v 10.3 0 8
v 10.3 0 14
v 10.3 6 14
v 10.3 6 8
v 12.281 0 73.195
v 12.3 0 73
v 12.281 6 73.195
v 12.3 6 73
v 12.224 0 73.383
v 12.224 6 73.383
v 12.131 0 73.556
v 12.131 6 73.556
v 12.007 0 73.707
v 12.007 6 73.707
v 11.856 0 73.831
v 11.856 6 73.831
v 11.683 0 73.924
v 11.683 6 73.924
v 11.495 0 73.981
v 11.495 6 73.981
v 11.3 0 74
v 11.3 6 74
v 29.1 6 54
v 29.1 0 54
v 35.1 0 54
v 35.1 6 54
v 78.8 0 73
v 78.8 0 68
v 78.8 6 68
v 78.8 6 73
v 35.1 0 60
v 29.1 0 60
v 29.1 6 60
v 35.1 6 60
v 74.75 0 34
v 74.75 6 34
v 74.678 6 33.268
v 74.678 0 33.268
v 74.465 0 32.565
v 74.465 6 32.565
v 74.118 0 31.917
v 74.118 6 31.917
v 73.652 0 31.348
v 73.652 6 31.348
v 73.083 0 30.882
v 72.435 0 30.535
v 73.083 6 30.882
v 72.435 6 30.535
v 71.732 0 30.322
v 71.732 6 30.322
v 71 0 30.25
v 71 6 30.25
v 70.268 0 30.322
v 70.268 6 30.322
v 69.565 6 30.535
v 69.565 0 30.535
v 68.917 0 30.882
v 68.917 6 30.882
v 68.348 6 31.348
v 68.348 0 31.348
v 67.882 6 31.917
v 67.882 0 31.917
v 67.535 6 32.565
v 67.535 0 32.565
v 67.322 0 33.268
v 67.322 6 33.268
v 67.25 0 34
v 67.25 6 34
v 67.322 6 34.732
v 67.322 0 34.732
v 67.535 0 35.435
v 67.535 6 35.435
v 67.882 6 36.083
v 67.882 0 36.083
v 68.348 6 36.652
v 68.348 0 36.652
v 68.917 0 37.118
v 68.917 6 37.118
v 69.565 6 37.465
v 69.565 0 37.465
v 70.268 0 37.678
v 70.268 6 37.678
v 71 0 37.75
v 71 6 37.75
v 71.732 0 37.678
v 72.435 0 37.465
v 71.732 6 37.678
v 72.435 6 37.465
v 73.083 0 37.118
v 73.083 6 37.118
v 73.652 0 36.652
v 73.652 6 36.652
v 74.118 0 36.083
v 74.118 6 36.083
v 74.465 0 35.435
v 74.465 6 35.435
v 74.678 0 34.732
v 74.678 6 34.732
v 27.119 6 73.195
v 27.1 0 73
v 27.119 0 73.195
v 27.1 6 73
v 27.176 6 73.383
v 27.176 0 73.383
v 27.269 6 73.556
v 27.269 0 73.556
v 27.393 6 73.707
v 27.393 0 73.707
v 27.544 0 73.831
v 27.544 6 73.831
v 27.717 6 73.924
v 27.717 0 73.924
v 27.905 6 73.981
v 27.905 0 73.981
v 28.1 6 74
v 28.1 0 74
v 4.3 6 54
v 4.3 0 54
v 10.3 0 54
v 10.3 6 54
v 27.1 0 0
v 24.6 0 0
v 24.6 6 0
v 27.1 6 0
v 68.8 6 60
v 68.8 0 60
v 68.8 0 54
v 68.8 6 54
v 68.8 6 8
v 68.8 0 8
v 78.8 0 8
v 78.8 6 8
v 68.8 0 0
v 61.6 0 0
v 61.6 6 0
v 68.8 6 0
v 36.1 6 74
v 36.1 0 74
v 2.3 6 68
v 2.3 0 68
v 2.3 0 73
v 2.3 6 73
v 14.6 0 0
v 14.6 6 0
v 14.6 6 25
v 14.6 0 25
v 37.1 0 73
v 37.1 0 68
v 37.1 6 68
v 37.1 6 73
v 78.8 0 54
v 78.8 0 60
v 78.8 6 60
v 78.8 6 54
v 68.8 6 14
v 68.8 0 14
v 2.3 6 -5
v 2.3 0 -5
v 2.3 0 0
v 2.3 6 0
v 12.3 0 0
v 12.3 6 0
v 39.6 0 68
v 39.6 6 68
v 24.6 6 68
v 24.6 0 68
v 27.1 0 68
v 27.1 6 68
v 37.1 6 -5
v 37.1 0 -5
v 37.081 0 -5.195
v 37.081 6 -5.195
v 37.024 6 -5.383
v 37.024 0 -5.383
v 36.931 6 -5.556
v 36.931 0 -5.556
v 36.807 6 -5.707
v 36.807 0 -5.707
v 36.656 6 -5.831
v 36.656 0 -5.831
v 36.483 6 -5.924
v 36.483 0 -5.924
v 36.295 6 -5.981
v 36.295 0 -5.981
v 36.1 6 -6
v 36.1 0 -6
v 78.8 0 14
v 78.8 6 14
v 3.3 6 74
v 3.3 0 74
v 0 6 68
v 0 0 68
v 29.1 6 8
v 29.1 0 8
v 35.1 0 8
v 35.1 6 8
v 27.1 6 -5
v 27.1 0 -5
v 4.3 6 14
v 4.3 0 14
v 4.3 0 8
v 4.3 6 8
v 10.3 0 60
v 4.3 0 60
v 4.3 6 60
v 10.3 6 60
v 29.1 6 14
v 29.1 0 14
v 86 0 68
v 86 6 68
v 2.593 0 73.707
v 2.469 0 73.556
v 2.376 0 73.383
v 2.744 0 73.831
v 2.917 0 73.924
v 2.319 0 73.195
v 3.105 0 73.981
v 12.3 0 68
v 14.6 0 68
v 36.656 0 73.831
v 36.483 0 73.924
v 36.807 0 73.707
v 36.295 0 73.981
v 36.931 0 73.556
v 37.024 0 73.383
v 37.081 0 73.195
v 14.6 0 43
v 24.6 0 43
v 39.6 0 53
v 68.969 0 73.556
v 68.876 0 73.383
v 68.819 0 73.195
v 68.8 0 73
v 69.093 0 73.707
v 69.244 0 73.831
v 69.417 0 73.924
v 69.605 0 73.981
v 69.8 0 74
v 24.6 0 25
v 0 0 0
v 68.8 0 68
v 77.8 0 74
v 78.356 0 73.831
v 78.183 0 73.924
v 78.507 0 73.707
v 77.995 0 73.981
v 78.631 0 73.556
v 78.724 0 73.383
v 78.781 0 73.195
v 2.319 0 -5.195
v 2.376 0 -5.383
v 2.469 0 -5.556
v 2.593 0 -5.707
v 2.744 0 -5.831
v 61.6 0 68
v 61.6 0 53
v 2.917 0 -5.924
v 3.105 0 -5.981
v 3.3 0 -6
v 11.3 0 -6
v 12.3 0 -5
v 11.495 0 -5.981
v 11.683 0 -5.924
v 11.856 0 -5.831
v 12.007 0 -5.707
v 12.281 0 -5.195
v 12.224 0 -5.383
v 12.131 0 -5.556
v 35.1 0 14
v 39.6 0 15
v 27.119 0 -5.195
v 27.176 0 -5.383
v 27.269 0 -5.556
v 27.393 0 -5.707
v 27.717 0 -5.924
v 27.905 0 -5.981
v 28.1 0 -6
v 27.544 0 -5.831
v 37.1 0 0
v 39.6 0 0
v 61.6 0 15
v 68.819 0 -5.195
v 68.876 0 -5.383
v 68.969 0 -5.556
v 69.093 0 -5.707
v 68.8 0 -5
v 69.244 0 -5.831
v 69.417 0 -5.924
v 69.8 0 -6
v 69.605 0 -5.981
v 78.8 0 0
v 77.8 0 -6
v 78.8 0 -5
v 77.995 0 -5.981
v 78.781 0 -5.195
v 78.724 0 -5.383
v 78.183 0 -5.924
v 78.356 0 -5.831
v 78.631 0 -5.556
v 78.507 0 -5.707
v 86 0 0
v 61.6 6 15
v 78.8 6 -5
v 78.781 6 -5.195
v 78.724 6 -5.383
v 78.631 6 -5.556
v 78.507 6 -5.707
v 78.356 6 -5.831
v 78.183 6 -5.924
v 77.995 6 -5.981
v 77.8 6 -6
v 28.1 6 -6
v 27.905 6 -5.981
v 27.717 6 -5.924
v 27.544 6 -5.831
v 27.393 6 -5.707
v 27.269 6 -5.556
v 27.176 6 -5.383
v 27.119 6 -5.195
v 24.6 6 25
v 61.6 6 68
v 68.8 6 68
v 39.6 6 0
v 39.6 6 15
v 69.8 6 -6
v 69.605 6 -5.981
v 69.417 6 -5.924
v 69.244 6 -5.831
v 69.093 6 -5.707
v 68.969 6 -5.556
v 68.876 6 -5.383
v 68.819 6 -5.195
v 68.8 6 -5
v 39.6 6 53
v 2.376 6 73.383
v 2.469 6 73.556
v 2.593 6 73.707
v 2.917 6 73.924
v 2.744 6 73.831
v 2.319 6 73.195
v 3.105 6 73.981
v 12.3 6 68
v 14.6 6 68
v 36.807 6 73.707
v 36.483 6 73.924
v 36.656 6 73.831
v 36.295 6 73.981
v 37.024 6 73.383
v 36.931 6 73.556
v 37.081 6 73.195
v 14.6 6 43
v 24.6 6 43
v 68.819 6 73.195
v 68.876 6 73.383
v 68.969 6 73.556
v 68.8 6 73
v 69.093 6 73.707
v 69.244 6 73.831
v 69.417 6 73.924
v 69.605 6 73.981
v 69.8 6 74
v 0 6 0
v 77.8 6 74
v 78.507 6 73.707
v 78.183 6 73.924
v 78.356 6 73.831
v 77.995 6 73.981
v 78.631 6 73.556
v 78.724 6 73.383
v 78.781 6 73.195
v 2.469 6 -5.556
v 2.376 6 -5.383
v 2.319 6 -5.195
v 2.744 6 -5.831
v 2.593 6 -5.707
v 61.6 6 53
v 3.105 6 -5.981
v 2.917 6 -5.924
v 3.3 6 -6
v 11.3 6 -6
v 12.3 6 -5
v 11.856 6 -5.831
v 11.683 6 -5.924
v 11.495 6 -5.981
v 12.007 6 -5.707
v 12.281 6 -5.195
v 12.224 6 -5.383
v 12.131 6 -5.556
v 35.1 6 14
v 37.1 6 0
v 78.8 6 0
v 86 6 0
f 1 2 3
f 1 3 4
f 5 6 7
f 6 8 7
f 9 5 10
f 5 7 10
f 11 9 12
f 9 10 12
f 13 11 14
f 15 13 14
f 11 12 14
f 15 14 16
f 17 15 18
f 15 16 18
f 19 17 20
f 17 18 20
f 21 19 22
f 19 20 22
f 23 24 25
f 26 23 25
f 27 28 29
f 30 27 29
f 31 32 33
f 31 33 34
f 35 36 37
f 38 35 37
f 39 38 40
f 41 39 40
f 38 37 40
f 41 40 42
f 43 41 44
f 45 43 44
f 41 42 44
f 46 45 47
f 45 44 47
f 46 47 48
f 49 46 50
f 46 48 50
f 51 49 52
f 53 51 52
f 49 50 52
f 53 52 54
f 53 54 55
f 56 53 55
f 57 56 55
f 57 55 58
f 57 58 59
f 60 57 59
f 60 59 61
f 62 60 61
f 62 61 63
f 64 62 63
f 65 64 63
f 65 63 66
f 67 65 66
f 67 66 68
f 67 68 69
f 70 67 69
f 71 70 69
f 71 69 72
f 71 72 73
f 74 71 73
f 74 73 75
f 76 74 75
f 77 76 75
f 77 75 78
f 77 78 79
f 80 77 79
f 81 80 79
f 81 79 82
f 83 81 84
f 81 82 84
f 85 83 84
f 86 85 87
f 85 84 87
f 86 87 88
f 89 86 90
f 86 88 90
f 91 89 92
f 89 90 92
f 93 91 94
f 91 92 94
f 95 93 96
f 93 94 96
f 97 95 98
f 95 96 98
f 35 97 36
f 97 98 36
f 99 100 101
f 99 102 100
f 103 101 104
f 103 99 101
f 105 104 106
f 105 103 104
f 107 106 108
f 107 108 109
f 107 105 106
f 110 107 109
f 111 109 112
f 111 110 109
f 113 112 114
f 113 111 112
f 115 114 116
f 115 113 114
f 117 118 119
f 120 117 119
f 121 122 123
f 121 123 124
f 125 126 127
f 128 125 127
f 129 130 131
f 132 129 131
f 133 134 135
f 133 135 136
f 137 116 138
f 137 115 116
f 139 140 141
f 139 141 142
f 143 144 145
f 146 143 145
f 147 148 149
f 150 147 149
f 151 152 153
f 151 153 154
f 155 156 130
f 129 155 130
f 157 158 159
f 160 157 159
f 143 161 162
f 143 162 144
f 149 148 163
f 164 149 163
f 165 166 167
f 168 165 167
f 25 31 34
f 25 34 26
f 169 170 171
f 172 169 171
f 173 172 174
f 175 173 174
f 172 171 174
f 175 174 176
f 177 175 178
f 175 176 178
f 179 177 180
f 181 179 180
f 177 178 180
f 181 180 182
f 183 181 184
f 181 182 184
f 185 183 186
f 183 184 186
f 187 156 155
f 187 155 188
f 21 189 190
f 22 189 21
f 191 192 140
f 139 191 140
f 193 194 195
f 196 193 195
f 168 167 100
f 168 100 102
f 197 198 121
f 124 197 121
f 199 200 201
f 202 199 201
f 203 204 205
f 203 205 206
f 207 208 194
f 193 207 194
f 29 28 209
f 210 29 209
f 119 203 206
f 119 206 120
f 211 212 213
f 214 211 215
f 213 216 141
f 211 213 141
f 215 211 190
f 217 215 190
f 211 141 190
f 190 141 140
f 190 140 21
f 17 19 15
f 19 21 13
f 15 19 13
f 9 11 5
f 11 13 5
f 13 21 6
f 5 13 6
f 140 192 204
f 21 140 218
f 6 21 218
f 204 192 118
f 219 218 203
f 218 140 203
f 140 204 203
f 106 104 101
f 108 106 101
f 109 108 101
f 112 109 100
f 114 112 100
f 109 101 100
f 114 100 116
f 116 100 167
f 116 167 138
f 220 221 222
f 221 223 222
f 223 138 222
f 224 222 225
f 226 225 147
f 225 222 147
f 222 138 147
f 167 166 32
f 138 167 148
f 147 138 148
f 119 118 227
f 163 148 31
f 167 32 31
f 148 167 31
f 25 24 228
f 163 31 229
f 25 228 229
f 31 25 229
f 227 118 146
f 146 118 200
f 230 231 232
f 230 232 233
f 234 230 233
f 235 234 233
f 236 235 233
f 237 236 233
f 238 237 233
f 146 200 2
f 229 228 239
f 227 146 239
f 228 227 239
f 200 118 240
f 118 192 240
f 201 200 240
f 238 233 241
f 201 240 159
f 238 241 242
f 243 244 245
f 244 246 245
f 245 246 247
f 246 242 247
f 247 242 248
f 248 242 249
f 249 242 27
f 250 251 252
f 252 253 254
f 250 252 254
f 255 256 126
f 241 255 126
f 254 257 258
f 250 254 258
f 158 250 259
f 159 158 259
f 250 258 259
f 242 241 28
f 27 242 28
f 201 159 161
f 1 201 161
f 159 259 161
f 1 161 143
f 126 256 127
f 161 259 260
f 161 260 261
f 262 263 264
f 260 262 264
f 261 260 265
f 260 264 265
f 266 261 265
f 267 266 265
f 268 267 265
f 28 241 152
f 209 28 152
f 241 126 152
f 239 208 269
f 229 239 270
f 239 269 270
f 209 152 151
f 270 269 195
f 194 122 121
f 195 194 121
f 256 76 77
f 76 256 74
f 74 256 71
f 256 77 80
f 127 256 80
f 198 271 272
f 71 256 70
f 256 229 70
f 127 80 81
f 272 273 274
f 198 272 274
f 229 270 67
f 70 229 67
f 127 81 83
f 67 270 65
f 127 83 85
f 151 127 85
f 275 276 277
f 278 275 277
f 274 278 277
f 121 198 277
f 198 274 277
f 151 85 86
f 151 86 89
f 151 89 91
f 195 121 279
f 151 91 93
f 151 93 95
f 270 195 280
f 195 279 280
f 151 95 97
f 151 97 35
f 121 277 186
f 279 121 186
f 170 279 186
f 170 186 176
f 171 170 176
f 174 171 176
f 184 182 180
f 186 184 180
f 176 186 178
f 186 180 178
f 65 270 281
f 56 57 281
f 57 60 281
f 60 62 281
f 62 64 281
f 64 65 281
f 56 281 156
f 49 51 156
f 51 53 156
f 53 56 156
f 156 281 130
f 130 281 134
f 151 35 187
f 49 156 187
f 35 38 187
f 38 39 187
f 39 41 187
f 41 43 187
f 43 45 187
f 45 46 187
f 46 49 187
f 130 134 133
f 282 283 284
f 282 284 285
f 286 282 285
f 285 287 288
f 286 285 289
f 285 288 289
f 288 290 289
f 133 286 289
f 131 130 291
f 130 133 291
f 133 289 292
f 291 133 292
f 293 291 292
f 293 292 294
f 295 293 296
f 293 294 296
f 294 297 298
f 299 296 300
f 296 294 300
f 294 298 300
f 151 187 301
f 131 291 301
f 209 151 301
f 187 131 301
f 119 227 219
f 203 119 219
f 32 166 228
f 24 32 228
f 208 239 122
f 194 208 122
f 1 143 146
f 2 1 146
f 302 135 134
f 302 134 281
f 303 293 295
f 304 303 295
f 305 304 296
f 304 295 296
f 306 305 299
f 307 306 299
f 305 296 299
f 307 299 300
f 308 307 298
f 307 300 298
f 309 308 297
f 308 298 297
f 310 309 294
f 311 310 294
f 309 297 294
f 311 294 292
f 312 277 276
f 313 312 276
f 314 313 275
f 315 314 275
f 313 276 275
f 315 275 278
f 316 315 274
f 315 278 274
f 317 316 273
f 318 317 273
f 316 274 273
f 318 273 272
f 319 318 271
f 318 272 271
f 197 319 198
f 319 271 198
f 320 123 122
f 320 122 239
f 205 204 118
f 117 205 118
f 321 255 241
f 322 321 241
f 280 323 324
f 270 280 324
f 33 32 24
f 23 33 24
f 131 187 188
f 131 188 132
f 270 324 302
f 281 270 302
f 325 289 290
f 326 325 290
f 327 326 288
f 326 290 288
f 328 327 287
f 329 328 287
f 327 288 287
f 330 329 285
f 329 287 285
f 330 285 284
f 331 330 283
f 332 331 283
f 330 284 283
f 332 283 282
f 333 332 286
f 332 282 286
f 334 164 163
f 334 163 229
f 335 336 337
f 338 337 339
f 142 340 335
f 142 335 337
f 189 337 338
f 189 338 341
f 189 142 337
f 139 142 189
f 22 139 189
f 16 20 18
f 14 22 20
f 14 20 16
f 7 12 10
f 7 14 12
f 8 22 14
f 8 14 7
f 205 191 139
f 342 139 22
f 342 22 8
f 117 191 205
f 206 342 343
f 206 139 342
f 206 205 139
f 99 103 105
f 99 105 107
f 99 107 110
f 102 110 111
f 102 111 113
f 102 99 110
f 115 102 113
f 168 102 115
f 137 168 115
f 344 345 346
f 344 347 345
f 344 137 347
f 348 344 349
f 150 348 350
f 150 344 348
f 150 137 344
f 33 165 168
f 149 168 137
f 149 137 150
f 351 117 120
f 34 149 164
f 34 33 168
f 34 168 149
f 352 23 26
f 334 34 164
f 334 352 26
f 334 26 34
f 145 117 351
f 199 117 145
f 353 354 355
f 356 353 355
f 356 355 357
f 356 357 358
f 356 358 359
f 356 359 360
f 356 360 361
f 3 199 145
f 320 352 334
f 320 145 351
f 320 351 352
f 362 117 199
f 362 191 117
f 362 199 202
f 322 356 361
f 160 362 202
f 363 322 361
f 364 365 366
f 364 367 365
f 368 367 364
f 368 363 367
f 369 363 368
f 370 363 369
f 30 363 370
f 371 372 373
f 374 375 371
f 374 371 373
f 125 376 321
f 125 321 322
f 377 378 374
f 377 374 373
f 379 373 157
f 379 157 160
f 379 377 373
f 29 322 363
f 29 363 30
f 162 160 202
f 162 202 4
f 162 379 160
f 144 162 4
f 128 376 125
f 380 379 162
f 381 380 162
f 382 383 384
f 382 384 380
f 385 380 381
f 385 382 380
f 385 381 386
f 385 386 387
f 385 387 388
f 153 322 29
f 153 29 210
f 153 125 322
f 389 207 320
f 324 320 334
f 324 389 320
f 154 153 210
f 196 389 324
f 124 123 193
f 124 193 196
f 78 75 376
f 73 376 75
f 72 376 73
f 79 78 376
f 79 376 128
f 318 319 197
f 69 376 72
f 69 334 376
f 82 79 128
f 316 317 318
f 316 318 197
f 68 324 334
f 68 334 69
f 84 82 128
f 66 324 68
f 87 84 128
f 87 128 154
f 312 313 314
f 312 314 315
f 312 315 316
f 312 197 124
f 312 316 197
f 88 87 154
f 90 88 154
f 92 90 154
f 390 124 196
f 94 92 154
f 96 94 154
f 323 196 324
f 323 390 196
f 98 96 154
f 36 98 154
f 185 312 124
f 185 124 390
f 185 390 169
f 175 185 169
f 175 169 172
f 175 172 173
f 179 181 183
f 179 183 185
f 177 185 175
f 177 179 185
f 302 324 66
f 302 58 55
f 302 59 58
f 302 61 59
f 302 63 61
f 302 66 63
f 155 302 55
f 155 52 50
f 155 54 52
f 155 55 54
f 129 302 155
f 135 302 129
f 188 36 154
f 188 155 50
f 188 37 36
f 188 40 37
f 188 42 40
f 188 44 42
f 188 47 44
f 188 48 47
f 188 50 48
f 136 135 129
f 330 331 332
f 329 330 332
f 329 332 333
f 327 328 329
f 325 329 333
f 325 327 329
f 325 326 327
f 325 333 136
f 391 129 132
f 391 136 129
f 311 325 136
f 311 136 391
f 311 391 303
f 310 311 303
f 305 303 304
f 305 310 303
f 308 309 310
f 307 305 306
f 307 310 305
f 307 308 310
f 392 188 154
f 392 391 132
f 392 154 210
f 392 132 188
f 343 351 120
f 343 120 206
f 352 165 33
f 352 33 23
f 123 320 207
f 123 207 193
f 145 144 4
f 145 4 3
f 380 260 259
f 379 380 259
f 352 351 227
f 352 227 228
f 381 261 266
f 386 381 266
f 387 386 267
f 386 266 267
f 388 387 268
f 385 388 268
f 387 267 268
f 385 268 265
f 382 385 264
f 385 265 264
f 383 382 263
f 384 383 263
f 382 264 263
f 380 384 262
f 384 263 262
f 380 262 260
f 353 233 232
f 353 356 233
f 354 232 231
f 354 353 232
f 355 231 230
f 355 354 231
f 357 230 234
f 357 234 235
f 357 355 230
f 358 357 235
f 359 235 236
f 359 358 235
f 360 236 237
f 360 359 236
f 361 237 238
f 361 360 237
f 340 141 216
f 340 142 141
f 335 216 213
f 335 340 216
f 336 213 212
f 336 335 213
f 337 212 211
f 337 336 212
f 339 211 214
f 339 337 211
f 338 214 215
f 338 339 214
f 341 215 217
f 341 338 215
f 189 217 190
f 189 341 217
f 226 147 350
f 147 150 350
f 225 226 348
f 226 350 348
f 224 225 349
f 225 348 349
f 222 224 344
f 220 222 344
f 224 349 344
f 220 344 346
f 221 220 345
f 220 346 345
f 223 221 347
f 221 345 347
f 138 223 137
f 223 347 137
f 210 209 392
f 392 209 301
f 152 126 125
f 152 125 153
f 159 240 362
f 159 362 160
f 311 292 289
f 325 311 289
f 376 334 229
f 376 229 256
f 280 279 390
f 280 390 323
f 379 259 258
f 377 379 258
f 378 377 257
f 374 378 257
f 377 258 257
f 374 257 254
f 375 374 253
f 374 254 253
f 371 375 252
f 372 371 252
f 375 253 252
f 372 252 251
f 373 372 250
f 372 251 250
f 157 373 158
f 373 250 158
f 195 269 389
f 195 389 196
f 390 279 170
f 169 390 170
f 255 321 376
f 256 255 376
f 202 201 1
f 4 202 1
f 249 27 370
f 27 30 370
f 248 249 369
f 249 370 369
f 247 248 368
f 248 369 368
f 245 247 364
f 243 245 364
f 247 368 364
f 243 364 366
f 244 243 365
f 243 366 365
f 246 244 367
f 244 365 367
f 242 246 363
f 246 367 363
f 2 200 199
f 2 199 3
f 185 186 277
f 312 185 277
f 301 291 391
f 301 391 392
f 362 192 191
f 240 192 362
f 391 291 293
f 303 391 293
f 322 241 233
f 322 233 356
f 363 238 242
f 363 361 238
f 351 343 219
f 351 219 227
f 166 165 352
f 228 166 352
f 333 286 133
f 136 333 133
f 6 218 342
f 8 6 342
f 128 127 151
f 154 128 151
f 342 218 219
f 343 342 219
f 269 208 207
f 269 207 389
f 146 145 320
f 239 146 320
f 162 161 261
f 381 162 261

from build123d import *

# Parameters (mm, degrees)
SKETCH1_W                  = 86
SKETCH1_H                  = 68
BOSS_EXTRUDE1_DEPTH        = 6
SKETCH2_W                  = 10
SKETCH2_H                  = 25
SKETCH2_W_2                = 22
SKETCH2_H_2                = 15
CUT_EXTRUDE1_DEPTH         = 110.79981785
F_7_5_7_5_DIAMETER_HOLE1_D = 7.5
SKETCH234_W                = 10
SKETCH234_H                = 6
BOSS_EXTRUDE234_DEPTH      = 6
FILLET134_R                = 1
SKETCH2341_W               = 10
SKETCH2341_H               = 6
BOSS_EXTRUDE2341_DEPTH     = 6
FILLET1341_R               = 1
SKETCH2342_W               = 10
SKETCH2342_H               = 6
BOSS_EXTRUDE2342_DEPTH     = 6
FILLET1342_R               = 1
CUT_EXTRUDE11_START        = -3
SKETCH6_W                  = 10
SKETCH6_H                  = 6
CUT_EXTRUDE11_DEPTH        = 6
CUT_EXTRUDE16_DEPTH        = 82.966859266
CUT_EXTRUDE16_DEPTH_BACK   = 82.966859266
SKETCH64_W                 = 6
SKETCH64_H                 = 6
CUT_EXTRUDE18_DEPTH        = 101.225385192
CUT_EXTRUDE18_DEPTH_BACK   = 101.225385192
SKETCH66_W                 = 6
SKETCH66_H                 = 6
MIRROR2_OUTLINE_W          = 10
MIRROR2_OUTLINE_H          = 6
MIRROR2_OUTLINE_W_2        = 6
MIRROR2_DEPTH              = 6
MIRROR2_2_DEPTH            = 6


# Read off the part's stored shape, not the designer's step: Mirror2
with BuildPart() as part:
    # Sketch1 → Boss-Extrude1 (new body)
    with BuildSketch(Plane(origin=(0, 0, 0), x_dir=(1, 0, 0), z_dir=(0, 1, 0))):
        with Locations((43, -34)):
            Rectangle(SKETCH1_W, SKETCH1_H)
    extrude(amount=BOSS_EXTRUDE1_DEPTH)

    # Sketch2 → Cut-Extrude1 (cut, through all)
    with BuildSketch(Plane(origin=(0, 6, 0), x_dir=(1, 0, 0), z_dir=(0, 1, 0))):
        with Locations((19.6, -55.5)):
            Rectangle(SKETCH2_W, SKETCH2_H)
        with Locations((50.6, -60.5)):
            Rectangle(SKETCH2_W_2, SKETCH2_H_2)
    cut_extrude1 = extrude(amount=-CUT_EXTRUDE1_DEPTH, mode=Mode.SUBTRACT)

    # Mirror1: Cut-Extrude1 across plane
    add(cut_extrude1.mirror(Plane.XY.offset(34)), mode=Mode.SUBTRACT)

    # Ø7.5 (7.5) Diameter Hole1 (through all)
    with Locations(Plane(origin=(0, 0, 0), x_dir=(-1, 0, 0), z_dir=(0, -1, 0))):
        with Locations((-71, -34)):
            Hole(F_7_5_7_5_DIAMETER_HOLE1_D / 2)

    # Sketch234 → Boss-Extrude234 (add)
    with BuildSketch(Plane(origin=(73.032221392, 0, 68), x_dir=(1, 0, 0), z_dir=(0, 0, 1))):
        with Locations((0.767778608, 3)):
            Rectangle(SKETCH234_W, SKETCH234_H)
    extrude(amount=BOSS_EXTRUDE234_DEPTH)

    # Fillet134
    fillet134_edges = [part.edges().sort_by_distance(p)[0] for p in [
        (78.8, 3, 74),
        (68.8, 3, 74),
    ]]
    fillet(fillet134_edges, radius=FILLET134_R)

    # Sketch2341 → Boss-Extrude2341 (add)
    with BuildSketch(Plane(origin=(31.332221392, 0, 68), x_dir=(1, 0, 0), z_dir=(0, 0, 1))):
        with Locations((0.767778608, 3)):
            Rectangle(SKETCH2341_W, SKETCH2341_H)
    extrude(amount=BOSS_EXTRUDE2341_DEPTH)

    # Fillet1341
    fillet1341_edges = [part.edges().sort_by_distance(p)[0] for p in [
        (37.1, 3, 74),
        (27.1, 3, 74),
    ]]
    fillet(fillet1341_edges, radius=FILLET1341_R)

    # Sketch2342 → Boss-Extrude2342 (add)
    with BuildSketch(Plane(origin=(6.532221392, 0, 68), x_dir=(1, 0, 0), z_dir=(0, 0, 1))):
        with Locations((0.767778608, 3)):
            Rectangle(SKETCH2342_W, SKETCH2342_H)
    extrude(amount=BOSS_EXTRUDE2342_DEPTH)

    # Fillet1342
    fillet1342_edges = [part.edges().sort_by_distance(p)[0] for p in [
        (12.3, 3, 74),
        (2.3, 3, 74),
    ]]
    fillet(fillet1342_edges, radius=FILLET1342_R)

    # Sketch6 → Cut-Extrude11 (cut)
    with BuildSketch(Plane(origin=(73.032221392, 3, 13), x_dir=(1, 0, 0), z_dir=(0, 1, 0)).offset(CUT_EXTRUDE11_START)):
        with Locations((0.767778608, -44)):
            Rectangle(SKETCH6_W, SKETCH6_H)
    extrude(amount=CUT_EXTRUDE11_DEPTH, mode=Mode.SUBTRACT)

    # Sketch64 → Cut-Extrude16 (cut, two sides: drawn at the far end of the back side and taken through both)
    with BuildSketch(Plane(origin=(31.332221392, 3, 13), x_dir=(1, 0, 0), z_dir=(0, 1, 0)).offset(-CUT_EXTRUDE16_DEPTH_BACK)):
        with Locations((0.767778608, -44)):
            Rectangle(SKETCH64_W, SKETCH64_H)
    extrude(amount=CUT_EXTRUDE16_DEPTH + CUT_EXTRUDE16_DEPTH_BACK, mode=Mode.SUBTRACT)

    # Sketch66 → Cut-Extrude18 (cut, two sides: drawn at the far end of the back side and taken through both)
    with BuildSketch(Plane(origin=(6.532221392, 3, 13), x_dir=(1, 0, 0), z_dir=(0, 1, 0)).offset(-CUT_EXTRUDE18_DEPTH_BACK)):
        with Locations((0.767778608, -44)):
            Rectangle(SKETCH66_W, SKETCH66_H)
    extrude(amount=CUT_EXTRUDE18_DEPTH + CUT_EXTRUDE18_DEPTH_BACK, mode=Mode.SUBTRACT)

    # Mirror2 outline → Mirror2 (cut)
    with BuildSketch(Plane(origin=(0, 0, 0), x_dir=(1, 0, 0), z_dir=(0, 1, 0))):
        with Locations((73.8, -11)):
            Rectangle(MIRROR2_OUTLINE_W, MIRROR2_OUTLINE_H)
        with Locations((32.1, -11)):
            Rectangle(MIRROR2_OUTLINE_W_2, MIRROR2_OUTLINE_H)
        with Locations((7.3, -11)):
            Rectangle(MIRROR2_OUTLINE_W_2, MIRROR2_OUTLINE_H)
    extrude(amount=MIRROR2_DEPTH, mode=Mode.SUBTRACT)

    # Mirror2 2 outline → Mirror2 2 (add)
    with BuildSketch(Plane(origin=(0, 0, 0), x_dir=(1, 0, 0), z_dir=(0, 1, 0))):
        with BuildLine():
            Line((68.8, 0), (78.8, 0))
            Line((78.8, 0), (78.8, 5))
            ThreePointArc((78.8, 5), (78.507106781, 5.707106781), (77.8, 6))
            Line((77.8, 6), (69.8, 6))
            ThreePointArc((69.8, 6), (69.092893219, 5.707106781), (68.8, 5))
            Line((68.8, 5), (68.8, 0))
        make_face()
        with BuildLine():
            Line((27.1, 0), (37.1, 0))
            Line((37.1, 0), (37.1, 5))
            ThreePointArc((37.1, 5), (36.807106781, 5.707106781), (36.1, 6))
            Line((36.1, 6), (28.1, 6))
            ThreePointArc((28.1, 6), (27.392893219, 5.707106781), (27.1, 5))
            Line((27.1, 5), (27.1, 0))
        make_face()
        with BuildLine():
            Line((2.3, 0), (12.3, 0))
            Line((12.3, 0), (12.3, 5))
            ThreePointArc((12.3, 5), (12.007106781, 5.707106781), (11.3, 6))
            Line((11.3, 6), (3.3, 6))
            ThreePointArc((3.3, 6), (2.592893219, 5.707106781), (2.3, 5))
            Line((2.3, 5), (2.3, 0))
        make_face()
    extrude(amount=MIRROR2_2_DEPTH)


solid = part.part
